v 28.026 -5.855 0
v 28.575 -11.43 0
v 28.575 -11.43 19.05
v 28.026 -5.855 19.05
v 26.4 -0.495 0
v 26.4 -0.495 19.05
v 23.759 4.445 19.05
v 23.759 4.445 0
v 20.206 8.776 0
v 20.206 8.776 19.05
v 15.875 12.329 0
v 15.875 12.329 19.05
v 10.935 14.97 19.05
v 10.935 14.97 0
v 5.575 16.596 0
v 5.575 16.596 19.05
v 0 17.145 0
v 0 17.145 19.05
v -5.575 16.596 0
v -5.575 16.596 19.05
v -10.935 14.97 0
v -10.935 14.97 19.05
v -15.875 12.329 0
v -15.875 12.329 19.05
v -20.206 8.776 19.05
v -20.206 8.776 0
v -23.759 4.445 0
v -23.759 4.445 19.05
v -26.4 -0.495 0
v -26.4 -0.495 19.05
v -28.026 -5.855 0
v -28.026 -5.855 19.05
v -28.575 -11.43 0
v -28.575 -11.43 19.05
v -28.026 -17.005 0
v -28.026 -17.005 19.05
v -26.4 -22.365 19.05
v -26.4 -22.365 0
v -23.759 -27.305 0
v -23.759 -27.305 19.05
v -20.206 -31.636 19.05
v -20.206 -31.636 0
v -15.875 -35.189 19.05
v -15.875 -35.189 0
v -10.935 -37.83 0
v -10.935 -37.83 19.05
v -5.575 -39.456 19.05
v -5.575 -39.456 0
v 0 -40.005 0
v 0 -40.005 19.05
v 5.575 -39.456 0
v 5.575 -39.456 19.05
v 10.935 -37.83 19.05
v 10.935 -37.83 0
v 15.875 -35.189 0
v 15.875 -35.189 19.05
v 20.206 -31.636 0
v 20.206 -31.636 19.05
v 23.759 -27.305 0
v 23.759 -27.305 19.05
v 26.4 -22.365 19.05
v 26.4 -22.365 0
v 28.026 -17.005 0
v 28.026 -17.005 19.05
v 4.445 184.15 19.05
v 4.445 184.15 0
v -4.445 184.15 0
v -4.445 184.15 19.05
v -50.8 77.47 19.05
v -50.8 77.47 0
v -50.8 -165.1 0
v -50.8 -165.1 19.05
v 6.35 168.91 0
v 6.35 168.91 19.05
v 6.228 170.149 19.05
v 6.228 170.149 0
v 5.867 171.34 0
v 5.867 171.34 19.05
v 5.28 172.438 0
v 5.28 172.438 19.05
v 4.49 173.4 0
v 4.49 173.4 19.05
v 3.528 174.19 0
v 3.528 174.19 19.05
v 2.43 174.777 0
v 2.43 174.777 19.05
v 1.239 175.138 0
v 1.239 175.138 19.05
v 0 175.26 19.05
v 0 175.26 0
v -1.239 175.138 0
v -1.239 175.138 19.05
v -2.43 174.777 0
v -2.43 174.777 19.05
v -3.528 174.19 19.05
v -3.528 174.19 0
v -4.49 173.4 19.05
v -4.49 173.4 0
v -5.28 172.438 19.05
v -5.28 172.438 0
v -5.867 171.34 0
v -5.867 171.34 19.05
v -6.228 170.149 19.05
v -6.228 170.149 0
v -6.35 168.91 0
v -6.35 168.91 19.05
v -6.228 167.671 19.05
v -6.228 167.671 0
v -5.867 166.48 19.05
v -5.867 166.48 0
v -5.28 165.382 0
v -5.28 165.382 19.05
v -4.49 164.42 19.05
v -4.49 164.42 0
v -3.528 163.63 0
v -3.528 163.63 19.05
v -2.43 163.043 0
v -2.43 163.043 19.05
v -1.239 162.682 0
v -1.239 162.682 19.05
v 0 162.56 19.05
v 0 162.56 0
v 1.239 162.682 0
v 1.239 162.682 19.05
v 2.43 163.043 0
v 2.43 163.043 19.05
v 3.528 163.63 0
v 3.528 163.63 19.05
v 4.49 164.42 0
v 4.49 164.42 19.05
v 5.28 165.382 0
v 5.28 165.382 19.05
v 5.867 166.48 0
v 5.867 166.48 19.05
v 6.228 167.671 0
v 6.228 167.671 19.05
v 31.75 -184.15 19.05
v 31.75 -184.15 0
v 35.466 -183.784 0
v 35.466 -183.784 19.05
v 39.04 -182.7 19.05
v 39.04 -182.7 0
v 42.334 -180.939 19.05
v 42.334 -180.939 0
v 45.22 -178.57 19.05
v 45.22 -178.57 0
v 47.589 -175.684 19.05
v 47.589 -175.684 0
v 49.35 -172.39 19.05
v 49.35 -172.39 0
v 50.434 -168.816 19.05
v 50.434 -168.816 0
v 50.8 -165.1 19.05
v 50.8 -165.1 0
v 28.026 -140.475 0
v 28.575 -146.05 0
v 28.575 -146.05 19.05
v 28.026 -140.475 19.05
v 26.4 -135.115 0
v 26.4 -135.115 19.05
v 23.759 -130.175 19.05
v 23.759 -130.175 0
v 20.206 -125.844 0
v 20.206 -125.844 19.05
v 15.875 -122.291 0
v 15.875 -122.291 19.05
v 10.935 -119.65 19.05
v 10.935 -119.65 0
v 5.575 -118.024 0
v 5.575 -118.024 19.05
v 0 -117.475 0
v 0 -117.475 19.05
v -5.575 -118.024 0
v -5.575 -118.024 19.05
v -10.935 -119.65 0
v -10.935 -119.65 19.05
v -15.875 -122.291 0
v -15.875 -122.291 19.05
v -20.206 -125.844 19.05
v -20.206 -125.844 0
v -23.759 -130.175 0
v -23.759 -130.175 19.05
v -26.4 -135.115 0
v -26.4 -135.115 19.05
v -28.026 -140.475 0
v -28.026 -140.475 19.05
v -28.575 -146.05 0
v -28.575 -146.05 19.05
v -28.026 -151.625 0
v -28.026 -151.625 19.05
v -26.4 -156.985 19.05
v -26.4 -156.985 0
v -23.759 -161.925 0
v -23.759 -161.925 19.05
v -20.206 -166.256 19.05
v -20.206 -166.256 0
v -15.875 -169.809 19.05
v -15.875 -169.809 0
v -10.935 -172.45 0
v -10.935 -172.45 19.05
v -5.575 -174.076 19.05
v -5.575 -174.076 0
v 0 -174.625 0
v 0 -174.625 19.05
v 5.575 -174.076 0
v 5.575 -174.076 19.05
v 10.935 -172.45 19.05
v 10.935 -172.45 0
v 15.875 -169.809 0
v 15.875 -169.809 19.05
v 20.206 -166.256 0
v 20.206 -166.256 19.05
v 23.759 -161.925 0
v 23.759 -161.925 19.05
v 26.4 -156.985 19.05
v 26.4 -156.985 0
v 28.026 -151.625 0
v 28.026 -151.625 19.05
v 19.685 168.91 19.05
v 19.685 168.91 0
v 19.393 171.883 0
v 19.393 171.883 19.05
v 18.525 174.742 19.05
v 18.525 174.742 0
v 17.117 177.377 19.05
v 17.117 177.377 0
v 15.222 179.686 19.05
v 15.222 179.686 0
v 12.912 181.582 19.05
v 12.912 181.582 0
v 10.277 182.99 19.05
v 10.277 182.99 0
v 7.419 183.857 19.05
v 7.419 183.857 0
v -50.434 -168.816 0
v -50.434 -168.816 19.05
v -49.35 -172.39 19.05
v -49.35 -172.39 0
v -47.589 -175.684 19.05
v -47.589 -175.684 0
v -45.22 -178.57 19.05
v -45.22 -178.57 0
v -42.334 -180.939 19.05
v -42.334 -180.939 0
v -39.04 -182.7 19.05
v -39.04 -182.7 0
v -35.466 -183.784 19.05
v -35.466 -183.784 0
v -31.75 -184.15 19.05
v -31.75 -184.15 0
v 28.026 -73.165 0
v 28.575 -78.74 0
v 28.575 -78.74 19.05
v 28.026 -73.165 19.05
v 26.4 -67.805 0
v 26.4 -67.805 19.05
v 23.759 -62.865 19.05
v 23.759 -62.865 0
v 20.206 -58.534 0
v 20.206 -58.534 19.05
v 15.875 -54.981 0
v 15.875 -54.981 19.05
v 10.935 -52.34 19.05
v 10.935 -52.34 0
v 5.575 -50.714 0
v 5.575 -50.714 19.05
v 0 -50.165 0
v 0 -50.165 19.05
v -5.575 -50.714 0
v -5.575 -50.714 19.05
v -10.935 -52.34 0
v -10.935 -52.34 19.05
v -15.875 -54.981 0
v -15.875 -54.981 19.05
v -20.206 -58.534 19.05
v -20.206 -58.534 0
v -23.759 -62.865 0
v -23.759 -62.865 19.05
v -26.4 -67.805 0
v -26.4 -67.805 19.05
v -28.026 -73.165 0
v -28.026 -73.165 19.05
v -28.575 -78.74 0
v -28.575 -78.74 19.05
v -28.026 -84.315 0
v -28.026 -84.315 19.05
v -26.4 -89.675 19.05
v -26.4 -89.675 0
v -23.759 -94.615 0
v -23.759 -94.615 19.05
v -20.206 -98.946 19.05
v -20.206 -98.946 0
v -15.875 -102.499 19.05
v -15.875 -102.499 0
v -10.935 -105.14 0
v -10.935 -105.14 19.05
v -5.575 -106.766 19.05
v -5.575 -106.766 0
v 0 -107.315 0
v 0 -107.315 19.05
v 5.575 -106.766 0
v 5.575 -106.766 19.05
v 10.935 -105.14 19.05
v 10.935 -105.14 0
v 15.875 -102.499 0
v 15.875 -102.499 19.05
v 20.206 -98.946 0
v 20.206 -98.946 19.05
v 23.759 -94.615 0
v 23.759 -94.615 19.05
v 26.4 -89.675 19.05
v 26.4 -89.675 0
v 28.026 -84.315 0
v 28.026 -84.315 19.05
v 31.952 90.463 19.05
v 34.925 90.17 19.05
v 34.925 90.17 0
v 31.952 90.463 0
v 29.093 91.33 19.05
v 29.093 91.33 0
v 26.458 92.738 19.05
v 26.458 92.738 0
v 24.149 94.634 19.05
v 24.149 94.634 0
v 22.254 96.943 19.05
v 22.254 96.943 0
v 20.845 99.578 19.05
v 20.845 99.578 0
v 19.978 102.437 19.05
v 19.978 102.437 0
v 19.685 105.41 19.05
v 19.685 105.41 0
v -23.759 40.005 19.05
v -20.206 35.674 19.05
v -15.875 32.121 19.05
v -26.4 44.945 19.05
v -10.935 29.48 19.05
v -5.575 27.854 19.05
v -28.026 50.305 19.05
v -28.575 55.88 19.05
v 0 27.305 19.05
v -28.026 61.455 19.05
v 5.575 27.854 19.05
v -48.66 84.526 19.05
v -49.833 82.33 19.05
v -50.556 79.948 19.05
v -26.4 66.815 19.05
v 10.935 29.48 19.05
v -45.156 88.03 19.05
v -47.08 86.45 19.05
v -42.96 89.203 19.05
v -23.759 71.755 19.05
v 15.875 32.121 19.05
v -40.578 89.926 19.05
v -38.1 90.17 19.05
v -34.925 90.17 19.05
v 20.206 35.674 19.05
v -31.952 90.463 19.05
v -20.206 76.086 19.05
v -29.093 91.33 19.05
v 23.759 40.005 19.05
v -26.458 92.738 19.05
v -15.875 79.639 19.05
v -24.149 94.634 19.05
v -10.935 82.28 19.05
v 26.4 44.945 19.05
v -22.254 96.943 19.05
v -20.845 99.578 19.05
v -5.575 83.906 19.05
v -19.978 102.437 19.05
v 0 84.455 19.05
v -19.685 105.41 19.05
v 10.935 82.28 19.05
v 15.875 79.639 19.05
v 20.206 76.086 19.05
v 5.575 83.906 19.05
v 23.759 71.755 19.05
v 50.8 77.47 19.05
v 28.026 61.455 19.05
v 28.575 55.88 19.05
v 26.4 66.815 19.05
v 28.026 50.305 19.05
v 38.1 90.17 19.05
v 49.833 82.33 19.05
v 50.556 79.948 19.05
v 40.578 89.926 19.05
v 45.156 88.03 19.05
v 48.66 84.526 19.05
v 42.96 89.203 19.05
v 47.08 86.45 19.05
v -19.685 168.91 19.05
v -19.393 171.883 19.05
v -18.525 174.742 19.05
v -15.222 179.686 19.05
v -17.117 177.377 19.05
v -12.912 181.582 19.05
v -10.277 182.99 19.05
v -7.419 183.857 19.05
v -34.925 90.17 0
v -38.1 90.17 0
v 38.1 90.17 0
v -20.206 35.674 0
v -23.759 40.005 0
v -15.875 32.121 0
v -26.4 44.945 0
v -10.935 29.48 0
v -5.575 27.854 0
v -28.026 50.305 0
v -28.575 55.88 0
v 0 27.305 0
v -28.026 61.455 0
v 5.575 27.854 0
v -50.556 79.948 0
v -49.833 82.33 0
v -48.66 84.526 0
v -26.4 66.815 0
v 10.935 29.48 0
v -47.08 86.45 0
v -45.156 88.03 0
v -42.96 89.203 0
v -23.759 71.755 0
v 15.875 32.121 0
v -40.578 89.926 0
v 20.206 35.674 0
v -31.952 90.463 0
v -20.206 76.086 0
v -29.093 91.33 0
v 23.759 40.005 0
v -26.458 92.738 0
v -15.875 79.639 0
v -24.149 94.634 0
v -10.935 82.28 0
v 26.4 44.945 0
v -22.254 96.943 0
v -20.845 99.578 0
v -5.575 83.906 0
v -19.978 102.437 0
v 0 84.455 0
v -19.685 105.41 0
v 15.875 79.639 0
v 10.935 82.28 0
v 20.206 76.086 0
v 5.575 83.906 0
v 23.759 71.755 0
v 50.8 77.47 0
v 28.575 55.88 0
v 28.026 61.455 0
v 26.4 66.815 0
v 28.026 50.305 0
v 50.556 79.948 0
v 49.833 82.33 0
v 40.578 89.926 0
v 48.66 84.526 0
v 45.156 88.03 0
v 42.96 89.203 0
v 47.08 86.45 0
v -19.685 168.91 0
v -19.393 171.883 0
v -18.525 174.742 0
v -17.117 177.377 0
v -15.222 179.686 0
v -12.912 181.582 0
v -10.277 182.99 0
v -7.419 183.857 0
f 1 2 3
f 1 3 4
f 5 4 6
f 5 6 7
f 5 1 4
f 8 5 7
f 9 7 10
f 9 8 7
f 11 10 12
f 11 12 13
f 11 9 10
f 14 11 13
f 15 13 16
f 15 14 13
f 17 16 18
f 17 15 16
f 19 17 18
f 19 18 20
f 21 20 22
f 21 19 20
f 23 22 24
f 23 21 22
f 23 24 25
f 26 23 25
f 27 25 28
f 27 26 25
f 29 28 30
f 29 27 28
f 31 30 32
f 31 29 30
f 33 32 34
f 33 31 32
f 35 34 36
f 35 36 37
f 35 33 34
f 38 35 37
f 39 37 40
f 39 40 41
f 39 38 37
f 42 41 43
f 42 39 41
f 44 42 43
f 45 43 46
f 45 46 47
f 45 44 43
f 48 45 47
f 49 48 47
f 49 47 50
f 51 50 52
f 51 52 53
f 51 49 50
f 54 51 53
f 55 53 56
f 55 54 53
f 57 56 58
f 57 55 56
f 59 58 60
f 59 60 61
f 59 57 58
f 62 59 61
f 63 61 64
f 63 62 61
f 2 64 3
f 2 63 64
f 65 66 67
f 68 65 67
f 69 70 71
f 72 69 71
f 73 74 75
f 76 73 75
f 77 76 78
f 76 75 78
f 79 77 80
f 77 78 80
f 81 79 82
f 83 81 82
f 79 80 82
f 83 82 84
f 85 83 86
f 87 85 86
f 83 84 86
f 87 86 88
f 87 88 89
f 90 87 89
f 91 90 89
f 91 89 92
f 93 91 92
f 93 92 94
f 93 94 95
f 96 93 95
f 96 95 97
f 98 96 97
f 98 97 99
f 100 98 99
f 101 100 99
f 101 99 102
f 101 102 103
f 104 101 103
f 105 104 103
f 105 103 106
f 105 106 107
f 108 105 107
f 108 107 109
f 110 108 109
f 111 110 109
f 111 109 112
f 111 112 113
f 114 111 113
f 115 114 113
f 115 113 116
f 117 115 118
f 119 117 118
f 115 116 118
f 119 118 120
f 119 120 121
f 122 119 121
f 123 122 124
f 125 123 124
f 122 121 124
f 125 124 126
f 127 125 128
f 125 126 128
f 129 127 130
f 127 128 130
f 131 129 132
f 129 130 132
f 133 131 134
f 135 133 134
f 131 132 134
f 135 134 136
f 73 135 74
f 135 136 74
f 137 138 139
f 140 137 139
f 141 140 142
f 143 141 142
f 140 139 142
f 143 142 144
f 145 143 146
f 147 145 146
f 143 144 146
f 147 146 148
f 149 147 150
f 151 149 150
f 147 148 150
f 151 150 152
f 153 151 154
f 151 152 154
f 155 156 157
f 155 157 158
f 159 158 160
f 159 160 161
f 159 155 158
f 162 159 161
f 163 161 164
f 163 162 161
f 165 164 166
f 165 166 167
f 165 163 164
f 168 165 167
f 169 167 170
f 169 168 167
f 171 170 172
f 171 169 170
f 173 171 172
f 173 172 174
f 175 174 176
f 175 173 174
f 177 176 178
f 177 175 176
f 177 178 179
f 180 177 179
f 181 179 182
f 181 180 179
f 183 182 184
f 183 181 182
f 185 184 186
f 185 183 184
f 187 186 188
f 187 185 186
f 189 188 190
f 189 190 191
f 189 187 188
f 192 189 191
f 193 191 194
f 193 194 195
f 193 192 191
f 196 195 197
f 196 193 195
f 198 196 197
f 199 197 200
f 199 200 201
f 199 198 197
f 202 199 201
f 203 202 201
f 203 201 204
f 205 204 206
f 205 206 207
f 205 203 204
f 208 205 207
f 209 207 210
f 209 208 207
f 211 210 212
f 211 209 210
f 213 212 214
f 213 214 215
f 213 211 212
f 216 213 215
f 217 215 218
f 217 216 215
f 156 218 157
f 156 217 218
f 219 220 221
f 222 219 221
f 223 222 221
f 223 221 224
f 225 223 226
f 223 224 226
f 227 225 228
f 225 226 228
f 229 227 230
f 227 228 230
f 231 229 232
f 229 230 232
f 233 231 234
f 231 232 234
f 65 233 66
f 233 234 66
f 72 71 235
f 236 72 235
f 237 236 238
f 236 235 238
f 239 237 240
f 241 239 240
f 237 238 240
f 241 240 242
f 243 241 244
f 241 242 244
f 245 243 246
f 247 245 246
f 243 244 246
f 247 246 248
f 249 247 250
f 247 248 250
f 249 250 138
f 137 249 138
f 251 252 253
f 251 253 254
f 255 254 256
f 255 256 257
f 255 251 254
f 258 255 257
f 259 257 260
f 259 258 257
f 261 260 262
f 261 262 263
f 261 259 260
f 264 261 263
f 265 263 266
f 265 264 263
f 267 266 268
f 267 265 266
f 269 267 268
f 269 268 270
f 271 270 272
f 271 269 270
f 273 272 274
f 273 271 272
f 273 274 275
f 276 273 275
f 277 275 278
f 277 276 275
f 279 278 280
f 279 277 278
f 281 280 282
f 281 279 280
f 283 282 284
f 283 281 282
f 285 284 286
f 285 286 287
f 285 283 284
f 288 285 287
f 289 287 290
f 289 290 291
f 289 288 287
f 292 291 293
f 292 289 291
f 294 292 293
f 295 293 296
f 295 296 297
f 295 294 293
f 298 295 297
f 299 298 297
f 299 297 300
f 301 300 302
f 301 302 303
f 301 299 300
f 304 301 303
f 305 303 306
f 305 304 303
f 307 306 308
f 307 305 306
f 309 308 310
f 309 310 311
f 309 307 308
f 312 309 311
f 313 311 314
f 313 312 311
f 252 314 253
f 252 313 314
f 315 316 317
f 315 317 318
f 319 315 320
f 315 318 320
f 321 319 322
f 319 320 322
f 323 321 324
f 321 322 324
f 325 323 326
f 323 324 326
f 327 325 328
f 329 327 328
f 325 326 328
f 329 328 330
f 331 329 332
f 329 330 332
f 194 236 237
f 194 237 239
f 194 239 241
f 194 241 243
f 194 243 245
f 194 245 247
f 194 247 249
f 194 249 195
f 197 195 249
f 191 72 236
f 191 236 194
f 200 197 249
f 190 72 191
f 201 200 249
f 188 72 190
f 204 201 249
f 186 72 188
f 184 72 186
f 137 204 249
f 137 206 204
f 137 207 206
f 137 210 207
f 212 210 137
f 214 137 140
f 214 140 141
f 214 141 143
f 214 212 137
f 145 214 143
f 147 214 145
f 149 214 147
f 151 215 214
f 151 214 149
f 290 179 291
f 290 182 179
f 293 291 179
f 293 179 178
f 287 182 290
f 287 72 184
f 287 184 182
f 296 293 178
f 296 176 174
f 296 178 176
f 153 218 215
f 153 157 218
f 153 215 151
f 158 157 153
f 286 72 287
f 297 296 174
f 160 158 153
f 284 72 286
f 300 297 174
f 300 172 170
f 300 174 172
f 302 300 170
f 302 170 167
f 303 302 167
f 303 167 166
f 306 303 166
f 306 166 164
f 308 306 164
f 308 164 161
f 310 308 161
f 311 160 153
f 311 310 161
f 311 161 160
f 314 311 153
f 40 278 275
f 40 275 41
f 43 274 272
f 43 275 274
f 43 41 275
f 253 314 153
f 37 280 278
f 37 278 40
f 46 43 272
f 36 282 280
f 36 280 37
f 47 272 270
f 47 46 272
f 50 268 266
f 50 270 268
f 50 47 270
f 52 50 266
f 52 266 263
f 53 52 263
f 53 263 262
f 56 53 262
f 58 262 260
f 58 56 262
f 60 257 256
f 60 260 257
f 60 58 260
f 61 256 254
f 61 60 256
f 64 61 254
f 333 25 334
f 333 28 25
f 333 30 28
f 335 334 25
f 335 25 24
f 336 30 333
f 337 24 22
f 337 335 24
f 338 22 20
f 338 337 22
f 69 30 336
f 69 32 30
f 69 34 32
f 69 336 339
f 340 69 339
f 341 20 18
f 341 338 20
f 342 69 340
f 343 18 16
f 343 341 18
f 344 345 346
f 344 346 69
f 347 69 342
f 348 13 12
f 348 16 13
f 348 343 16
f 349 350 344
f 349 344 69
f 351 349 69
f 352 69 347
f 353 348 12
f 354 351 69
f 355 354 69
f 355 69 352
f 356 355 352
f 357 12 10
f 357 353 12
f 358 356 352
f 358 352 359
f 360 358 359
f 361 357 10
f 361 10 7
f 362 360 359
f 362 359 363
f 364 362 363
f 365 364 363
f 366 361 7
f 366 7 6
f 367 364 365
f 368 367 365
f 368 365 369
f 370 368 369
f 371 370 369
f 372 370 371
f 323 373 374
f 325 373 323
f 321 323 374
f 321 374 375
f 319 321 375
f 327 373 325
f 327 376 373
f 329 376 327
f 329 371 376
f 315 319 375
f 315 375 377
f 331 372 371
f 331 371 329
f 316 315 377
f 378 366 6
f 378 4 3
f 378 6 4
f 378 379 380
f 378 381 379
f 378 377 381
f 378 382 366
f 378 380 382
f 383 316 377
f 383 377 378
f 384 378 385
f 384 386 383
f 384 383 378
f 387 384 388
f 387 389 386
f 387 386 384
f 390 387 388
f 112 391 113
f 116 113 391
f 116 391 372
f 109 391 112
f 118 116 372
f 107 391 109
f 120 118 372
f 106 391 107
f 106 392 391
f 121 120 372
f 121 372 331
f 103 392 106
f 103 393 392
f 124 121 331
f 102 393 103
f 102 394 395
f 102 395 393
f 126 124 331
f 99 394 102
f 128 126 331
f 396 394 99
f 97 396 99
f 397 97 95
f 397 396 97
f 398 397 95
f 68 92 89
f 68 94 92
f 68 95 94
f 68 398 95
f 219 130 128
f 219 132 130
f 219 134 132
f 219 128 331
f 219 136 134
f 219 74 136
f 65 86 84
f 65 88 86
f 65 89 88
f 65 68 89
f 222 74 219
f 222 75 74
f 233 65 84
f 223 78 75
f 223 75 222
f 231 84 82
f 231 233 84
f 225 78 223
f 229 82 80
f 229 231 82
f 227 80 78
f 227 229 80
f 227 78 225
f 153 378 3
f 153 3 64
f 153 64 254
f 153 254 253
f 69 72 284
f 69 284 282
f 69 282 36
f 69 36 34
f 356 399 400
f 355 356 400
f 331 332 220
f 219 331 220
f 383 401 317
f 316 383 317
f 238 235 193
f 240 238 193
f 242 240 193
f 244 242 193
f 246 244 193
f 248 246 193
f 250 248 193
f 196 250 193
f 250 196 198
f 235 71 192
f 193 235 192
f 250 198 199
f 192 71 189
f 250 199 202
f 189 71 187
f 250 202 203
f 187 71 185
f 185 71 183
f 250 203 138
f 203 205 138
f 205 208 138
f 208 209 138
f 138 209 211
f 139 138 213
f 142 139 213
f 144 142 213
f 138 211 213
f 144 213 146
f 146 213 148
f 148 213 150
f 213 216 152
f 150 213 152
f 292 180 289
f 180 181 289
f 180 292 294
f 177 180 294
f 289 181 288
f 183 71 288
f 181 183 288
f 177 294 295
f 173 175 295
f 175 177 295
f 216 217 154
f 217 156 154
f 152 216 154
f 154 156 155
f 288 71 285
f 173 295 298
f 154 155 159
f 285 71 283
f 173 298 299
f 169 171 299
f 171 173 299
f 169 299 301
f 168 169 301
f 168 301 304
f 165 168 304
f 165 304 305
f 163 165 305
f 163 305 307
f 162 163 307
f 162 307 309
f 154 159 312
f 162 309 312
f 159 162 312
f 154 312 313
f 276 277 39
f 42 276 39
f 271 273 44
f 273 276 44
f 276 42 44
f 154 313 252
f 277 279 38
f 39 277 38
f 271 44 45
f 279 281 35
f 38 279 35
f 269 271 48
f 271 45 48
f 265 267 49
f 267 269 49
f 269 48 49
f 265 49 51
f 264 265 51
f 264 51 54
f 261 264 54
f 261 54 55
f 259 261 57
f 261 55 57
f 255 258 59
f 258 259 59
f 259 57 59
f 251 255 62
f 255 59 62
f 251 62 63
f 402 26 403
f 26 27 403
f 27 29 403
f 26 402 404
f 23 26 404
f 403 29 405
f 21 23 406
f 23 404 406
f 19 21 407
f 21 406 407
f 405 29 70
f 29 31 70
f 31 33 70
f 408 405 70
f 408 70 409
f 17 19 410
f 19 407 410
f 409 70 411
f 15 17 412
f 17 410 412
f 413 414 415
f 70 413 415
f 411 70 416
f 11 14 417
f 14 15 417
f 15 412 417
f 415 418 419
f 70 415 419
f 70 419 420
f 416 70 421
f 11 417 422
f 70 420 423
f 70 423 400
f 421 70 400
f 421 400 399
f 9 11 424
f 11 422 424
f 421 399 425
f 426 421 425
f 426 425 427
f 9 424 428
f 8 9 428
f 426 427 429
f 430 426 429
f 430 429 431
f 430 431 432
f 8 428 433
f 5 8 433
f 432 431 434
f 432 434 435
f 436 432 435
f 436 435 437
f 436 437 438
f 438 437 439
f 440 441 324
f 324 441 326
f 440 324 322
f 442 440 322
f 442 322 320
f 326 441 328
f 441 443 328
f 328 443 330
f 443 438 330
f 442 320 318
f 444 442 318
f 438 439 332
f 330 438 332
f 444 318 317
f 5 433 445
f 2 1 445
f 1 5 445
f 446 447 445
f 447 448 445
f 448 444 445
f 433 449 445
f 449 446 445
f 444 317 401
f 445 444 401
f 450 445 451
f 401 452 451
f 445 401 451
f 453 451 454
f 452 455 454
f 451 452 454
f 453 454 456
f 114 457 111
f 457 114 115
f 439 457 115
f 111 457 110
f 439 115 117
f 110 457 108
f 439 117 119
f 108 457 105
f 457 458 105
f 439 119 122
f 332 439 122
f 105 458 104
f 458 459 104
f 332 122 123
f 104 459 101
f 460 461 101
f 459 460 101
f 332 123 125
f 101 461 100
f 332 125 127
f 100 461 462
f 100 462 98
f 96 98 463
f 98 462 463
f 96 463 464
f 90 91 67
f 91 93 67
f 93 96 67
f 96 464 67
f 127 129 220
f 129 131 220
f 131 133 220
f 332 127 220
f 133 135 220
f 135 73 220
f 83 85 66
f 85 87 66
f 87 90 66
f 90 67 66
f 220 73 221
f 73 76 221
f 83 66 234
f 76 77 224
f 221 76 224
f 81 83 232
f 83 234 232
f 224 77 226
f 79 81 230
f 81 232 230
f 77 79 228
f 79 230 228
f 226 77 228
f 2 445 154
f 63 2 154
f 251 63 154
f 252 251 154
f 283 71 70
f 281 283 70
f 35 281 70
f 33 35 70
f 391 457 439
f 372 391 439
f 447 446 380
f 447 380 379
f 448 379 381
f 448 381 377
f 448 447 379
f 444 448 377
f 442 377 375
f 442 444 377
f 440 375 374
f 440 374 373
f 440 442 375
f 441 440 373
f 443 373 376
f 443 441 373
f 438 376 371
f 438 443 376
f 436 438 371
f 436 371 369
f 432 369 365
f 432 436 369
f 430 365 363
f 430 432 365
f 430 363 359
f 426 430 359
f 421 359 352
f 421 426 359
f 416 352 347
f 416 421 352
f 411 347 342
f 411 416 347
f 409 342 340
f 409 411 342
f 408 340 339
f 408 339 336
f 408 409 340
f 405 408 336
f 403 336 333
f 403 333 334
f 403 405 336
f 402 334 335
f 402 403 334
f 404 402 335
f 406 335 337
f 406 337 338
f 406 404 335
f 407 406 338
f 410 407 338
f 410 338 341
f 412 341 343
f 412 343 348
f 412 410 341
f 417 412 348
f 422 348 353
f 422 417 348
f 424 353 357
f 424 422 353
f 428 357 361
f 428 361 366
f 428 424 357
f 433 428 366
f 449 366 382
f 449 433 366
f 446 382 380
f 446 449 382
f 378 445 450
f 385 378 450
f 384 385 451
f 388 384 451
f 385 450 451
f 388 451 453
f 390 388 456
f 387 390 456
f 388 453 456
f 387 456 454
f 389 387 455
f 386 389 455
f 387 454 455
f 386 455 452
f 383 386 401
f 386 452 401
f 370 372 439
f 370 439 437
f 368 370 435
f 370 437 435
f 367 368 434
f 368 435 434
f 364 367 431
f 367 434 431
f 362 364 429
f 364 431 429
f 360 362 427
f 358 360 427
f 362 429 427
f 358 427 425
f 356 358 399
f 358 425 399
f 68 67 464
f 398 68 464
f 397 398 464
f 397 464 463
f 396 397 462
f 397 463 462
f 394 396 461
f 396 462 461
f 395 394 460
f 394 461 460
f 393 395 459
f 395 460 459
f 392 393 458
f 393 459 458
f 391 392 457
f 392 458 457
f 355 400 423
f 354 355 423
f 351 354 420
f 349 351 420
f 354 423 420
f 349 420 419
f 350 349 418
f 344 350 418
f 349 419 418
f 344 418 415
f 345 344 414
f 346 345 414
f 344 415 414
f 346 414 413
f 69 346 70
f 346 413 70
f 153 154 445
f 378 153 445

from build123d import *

# Parameters (mm, degrees)
F0_R     = 28.575
F1_DEPTH = 19.05
F2_R     = 6.35
F3_DEPTH = 19.051


with BuildPart() as f1:
    # F0 (on Top) → F1 (new body)
    with BuildSketch(Plane.XY):
        with BuildLine():
            ThreePointArc((-50.8, -165.1), (-45.220384, -178.570384), (-31.75, -184.15))
            Line((-31.75, -184.15), (31.75, -184.15))
            ThreePointArc((31.75, -184.15), (45.220384, -178.570384), (50.8, -165.1))
            Line((50.8, -165.1), (50.8, 77.47))
            ThreePointArc((50.8, 77.47), (47.080256, 86.450256), (38.1, 90.17))
            Line((38.1, 90.17), (34.925337, 90.17))
            ThreePointArc((34.925337, 90.17), (24.14903, 94.633693), (19.685337, 105.41))
            Line((19.685337, 105.41), (19.685337, 168.91))
            ThreePointArc((19.685337, 168.91), (15.221645, 179.686307), (4.445337, 184.15))
            Line((4.445337, 184.15), (-4.445337, 184.15))
            ThreePointArc((-4.445337, 184.15), (-15.221645, 179.686307), (-19.685337, 168.91))
            Line((-19.685337, 168.91), (-19.685337, 105.41))
            ThreePointArc((-19.685337, 105.41), (-24.14903, 94.633693), (-34.925337, 90.17))
            Line((-34.925337, 90.17), (-38.1, 90.17))
            ThreePointArc((-38.1, 90.17), (-47.080256, 86.450256), (-50.8, 77.47))
            Line((-50.8, 77.47), (-50.8, -165.1))
        make_face()
        with Locations((0, -146.05)):
            Circle(F0_R, mode=Mode.SUBTRACT)
        with Locations((0, -78.74)):
            Circle(F0_R, mode=Mode.SUBTRACT)
        with Locations((0, -11.43)):
            Circle(F0_R, mode=Mode.SUBTRACT)
        with Locations((0, 55.88)):
            Circle(F0_R, mode=Mode.SUBTRACT)
    extrude(amount=F1_DEPTH)

    # F2 (on face) → F3 (cut, through all)
    with BuildSketch(Plane.XY.offset(19.05)):
        with Locations((0, 168.91)):
            Circle(F2_R)
    extrude(amount=-F3_DEPTH, mode=Mode.SUBTRACT)


solid = f1.part
